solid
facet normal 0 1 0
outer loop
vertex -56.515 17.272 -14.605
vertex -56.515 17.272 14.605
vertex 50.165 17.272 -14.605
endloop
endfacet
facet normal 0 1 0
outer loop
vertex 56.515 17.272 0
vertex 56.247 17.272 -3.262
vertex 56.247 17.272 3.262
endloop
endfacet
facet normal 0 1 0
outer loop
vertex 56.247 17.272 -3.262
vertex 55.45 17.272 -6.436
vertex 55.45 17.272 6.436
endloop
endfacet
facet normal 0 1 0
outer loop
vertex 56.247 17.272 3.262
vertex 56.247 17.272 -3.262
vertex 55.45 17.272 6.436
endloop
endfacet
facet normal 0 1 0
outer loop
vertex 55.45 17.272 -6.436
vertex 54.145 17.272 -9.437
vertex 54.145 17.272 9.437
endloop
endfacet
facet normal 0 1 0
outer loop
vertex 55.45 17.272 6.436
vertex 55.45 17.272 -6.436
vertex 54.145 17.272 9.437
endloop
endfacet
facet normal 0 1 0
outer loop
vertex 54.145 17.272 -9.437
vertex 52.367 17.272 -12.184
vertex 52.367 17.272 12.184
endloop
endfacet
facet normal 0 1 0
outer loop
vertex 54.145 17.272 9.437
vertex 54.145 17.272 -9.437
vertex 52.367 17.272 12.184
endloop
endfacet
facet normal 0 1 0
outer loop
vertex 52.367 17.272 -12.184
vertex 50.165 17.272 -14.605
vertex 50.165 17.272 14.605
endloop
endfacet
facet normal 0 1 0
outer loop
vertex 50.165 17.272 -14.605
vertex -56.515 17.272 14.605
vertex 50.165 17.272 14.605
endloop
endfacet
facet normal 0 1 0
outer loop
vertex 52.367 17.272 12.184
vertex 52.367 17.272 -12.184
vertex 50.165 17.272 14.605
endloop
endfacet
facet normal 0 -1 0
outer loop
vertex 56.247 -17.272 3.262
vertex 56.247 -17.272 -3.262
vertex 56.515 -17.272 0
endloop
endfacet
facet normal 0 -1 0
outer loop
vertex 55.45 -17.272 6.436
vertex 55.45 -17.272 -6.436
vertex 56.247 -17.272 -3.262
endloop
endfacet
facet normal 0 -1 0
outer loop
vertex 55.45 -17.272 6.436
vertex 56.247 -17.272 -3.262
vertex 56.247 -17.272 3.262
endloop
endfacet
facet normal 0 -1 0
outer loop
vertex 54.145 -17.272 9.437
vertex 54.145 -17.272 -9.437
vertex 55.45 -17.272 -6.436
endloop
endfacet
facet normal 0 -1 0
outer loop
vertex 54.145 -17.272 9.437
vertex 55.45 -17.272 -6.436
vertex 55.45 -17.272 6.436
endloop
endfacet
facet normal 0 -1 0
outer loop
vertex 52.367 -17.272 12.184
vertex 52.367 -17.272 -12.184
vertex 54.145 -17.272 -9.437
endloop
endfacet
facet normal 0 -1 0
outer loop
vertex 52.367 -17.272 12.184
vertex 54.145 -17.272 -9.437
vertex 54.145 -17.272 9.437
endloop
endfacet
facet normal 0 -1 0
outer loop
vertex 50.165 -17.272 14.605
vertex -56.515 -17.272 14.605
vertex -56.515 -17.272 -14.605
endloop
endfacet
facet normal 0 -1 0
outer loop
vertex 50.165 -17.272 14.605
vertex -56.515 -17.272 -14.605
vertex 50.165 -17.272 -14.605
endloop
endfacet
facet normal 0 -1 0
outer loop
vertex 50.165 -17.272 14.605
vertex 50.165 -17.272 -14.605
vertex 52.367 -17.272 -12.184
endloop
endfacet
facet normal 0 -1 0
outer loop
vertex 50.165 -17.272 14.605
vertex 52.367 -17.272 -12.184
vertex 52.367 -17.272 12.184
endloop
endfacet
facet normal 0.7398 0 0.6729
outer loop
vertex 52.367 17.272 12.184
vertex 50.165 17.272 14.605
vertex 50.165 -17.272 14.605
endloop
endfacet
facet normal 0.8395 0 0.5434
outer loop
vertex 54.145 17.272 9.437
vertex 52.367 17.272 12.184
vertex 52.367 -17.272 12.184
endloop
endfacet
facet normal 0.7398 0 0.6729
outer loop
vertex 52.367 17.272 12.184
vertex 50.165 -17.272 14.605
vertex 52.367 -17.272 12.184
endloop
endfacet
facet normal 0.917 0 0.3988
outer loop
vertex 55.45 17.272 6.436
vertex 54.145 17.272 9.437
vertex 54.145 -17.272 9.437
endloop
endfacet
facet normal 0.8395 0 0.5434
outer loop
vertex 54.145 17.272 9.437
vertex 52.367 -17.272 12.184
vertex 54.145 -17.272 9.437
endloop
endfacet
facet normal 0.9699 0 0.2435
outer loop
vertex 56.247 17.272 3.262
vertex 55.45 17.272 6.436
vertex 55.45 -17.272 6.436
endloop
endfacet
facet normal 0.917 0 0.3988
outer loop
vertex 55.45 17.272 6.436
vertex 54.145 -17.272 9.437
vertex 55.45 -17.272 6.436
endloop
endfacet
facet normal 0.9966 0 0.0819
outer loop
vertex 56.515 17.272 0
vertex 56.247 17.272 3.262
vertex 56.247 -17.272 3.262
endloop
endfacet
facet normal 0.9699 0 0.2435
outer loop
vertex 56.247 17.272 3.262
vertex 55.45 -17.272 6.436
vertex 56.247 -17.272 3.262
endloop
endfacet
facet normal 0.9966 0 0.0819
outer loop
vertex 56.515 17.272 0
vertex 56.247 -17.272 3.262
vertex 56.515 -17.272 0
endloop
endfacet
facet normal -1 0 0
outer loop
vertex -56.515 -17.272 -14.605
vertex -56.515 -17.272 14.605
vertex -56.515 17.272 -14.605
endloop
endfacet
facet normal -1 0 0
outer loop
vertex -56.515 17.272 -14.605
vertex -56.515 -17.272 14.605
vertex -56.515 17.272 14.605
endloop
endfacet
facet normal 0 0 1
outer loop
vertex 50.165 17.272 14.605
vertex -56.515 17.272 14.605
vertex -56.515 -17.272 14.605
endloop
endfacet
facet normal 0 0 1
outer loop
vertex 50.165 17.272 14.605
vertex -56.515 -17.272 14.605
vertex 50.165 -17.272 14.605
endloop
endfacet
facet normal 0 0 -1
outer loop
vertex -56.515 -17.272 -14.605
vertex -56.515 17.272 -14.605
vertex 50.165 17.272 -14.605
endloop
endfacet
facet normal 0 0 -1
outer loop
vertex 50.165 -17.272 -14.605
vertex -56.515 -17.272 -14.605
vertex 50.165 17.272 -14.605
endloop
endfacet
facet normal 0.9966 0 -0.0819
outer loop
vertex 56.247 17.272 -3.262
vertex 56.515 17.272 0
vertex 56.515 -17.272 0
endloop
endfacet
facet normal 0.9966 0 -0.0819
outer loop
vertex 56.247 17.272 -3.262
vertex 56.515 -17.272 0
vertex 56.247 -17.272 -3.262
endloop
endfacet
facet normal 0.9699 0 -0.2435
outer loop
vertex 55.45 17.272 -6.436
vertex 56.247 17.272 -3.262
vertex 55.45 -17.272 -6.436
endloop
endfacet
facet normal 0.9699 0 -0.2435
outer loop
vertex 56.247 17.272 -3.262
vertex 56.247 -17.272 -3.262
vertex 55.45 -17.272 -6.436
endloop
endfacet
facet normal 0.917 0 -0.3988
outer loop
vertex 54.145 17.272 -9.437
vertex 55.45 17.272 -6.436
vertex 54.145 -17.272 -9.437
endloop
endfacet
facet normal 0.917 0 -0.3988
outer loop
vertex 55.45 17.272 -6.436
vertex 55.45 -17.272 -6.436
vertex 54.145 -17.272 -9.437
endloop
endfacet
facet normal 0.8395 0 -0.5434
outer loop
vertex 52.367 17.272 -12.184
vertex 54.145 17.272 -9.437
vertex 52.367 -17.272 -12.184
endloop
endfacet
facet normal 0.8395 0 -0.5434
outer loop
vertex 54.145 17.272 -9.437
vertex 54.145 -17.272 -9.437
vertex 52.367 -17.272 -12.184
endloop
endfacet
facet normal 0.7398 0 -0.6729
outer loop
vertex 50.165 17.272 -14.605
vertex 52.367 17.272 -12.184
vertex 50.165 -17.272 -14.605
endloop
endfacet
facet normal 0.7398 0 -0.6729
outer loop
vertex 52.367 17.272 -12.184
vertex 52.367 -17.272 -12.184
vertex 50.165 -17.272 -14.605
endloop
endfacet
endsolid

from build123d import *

# Parameters (mm, degrees)
F0_W     = 113.03
F0_H     = 34.544
F1_DEPTH = 14.605
F3_DEPTH = 34.545


with BuildPart() as f1:
    # F0 (on Top) → F1 (new body, symmetric)
    with BuildSketch(Plane.XY):
        Rectangle(F0_W, F0_H)
    extrude(amount=F1_DEPTH, both=True)

    # F2 (on face) → F3 (cut, through all)
    with BuildSketch(Plane.XZ.offset(17.272)):
        with BuildLine():
            ThreePointArc((50.165, 14.605), (54.858827, 7.962859), (56.515, 0))
            Line((56.515, 0), (56.515, 14.605))
            Line((56.515, 14.605), (50.165, 14.605))
        make_face()
        with BuildLine():
            ThreePointArc((56.515, 0), (54.858827, -7.962859), (50.165, -14.605))
            Line((50.165, -14.605), (56.515, -14.605))
            Line((56.515, -14.605), (56.515, 0))
        make_face()
    extrude(amount=-F3_DEPTH, mode=Mode.SUBTRACT)


solid = f1.part
